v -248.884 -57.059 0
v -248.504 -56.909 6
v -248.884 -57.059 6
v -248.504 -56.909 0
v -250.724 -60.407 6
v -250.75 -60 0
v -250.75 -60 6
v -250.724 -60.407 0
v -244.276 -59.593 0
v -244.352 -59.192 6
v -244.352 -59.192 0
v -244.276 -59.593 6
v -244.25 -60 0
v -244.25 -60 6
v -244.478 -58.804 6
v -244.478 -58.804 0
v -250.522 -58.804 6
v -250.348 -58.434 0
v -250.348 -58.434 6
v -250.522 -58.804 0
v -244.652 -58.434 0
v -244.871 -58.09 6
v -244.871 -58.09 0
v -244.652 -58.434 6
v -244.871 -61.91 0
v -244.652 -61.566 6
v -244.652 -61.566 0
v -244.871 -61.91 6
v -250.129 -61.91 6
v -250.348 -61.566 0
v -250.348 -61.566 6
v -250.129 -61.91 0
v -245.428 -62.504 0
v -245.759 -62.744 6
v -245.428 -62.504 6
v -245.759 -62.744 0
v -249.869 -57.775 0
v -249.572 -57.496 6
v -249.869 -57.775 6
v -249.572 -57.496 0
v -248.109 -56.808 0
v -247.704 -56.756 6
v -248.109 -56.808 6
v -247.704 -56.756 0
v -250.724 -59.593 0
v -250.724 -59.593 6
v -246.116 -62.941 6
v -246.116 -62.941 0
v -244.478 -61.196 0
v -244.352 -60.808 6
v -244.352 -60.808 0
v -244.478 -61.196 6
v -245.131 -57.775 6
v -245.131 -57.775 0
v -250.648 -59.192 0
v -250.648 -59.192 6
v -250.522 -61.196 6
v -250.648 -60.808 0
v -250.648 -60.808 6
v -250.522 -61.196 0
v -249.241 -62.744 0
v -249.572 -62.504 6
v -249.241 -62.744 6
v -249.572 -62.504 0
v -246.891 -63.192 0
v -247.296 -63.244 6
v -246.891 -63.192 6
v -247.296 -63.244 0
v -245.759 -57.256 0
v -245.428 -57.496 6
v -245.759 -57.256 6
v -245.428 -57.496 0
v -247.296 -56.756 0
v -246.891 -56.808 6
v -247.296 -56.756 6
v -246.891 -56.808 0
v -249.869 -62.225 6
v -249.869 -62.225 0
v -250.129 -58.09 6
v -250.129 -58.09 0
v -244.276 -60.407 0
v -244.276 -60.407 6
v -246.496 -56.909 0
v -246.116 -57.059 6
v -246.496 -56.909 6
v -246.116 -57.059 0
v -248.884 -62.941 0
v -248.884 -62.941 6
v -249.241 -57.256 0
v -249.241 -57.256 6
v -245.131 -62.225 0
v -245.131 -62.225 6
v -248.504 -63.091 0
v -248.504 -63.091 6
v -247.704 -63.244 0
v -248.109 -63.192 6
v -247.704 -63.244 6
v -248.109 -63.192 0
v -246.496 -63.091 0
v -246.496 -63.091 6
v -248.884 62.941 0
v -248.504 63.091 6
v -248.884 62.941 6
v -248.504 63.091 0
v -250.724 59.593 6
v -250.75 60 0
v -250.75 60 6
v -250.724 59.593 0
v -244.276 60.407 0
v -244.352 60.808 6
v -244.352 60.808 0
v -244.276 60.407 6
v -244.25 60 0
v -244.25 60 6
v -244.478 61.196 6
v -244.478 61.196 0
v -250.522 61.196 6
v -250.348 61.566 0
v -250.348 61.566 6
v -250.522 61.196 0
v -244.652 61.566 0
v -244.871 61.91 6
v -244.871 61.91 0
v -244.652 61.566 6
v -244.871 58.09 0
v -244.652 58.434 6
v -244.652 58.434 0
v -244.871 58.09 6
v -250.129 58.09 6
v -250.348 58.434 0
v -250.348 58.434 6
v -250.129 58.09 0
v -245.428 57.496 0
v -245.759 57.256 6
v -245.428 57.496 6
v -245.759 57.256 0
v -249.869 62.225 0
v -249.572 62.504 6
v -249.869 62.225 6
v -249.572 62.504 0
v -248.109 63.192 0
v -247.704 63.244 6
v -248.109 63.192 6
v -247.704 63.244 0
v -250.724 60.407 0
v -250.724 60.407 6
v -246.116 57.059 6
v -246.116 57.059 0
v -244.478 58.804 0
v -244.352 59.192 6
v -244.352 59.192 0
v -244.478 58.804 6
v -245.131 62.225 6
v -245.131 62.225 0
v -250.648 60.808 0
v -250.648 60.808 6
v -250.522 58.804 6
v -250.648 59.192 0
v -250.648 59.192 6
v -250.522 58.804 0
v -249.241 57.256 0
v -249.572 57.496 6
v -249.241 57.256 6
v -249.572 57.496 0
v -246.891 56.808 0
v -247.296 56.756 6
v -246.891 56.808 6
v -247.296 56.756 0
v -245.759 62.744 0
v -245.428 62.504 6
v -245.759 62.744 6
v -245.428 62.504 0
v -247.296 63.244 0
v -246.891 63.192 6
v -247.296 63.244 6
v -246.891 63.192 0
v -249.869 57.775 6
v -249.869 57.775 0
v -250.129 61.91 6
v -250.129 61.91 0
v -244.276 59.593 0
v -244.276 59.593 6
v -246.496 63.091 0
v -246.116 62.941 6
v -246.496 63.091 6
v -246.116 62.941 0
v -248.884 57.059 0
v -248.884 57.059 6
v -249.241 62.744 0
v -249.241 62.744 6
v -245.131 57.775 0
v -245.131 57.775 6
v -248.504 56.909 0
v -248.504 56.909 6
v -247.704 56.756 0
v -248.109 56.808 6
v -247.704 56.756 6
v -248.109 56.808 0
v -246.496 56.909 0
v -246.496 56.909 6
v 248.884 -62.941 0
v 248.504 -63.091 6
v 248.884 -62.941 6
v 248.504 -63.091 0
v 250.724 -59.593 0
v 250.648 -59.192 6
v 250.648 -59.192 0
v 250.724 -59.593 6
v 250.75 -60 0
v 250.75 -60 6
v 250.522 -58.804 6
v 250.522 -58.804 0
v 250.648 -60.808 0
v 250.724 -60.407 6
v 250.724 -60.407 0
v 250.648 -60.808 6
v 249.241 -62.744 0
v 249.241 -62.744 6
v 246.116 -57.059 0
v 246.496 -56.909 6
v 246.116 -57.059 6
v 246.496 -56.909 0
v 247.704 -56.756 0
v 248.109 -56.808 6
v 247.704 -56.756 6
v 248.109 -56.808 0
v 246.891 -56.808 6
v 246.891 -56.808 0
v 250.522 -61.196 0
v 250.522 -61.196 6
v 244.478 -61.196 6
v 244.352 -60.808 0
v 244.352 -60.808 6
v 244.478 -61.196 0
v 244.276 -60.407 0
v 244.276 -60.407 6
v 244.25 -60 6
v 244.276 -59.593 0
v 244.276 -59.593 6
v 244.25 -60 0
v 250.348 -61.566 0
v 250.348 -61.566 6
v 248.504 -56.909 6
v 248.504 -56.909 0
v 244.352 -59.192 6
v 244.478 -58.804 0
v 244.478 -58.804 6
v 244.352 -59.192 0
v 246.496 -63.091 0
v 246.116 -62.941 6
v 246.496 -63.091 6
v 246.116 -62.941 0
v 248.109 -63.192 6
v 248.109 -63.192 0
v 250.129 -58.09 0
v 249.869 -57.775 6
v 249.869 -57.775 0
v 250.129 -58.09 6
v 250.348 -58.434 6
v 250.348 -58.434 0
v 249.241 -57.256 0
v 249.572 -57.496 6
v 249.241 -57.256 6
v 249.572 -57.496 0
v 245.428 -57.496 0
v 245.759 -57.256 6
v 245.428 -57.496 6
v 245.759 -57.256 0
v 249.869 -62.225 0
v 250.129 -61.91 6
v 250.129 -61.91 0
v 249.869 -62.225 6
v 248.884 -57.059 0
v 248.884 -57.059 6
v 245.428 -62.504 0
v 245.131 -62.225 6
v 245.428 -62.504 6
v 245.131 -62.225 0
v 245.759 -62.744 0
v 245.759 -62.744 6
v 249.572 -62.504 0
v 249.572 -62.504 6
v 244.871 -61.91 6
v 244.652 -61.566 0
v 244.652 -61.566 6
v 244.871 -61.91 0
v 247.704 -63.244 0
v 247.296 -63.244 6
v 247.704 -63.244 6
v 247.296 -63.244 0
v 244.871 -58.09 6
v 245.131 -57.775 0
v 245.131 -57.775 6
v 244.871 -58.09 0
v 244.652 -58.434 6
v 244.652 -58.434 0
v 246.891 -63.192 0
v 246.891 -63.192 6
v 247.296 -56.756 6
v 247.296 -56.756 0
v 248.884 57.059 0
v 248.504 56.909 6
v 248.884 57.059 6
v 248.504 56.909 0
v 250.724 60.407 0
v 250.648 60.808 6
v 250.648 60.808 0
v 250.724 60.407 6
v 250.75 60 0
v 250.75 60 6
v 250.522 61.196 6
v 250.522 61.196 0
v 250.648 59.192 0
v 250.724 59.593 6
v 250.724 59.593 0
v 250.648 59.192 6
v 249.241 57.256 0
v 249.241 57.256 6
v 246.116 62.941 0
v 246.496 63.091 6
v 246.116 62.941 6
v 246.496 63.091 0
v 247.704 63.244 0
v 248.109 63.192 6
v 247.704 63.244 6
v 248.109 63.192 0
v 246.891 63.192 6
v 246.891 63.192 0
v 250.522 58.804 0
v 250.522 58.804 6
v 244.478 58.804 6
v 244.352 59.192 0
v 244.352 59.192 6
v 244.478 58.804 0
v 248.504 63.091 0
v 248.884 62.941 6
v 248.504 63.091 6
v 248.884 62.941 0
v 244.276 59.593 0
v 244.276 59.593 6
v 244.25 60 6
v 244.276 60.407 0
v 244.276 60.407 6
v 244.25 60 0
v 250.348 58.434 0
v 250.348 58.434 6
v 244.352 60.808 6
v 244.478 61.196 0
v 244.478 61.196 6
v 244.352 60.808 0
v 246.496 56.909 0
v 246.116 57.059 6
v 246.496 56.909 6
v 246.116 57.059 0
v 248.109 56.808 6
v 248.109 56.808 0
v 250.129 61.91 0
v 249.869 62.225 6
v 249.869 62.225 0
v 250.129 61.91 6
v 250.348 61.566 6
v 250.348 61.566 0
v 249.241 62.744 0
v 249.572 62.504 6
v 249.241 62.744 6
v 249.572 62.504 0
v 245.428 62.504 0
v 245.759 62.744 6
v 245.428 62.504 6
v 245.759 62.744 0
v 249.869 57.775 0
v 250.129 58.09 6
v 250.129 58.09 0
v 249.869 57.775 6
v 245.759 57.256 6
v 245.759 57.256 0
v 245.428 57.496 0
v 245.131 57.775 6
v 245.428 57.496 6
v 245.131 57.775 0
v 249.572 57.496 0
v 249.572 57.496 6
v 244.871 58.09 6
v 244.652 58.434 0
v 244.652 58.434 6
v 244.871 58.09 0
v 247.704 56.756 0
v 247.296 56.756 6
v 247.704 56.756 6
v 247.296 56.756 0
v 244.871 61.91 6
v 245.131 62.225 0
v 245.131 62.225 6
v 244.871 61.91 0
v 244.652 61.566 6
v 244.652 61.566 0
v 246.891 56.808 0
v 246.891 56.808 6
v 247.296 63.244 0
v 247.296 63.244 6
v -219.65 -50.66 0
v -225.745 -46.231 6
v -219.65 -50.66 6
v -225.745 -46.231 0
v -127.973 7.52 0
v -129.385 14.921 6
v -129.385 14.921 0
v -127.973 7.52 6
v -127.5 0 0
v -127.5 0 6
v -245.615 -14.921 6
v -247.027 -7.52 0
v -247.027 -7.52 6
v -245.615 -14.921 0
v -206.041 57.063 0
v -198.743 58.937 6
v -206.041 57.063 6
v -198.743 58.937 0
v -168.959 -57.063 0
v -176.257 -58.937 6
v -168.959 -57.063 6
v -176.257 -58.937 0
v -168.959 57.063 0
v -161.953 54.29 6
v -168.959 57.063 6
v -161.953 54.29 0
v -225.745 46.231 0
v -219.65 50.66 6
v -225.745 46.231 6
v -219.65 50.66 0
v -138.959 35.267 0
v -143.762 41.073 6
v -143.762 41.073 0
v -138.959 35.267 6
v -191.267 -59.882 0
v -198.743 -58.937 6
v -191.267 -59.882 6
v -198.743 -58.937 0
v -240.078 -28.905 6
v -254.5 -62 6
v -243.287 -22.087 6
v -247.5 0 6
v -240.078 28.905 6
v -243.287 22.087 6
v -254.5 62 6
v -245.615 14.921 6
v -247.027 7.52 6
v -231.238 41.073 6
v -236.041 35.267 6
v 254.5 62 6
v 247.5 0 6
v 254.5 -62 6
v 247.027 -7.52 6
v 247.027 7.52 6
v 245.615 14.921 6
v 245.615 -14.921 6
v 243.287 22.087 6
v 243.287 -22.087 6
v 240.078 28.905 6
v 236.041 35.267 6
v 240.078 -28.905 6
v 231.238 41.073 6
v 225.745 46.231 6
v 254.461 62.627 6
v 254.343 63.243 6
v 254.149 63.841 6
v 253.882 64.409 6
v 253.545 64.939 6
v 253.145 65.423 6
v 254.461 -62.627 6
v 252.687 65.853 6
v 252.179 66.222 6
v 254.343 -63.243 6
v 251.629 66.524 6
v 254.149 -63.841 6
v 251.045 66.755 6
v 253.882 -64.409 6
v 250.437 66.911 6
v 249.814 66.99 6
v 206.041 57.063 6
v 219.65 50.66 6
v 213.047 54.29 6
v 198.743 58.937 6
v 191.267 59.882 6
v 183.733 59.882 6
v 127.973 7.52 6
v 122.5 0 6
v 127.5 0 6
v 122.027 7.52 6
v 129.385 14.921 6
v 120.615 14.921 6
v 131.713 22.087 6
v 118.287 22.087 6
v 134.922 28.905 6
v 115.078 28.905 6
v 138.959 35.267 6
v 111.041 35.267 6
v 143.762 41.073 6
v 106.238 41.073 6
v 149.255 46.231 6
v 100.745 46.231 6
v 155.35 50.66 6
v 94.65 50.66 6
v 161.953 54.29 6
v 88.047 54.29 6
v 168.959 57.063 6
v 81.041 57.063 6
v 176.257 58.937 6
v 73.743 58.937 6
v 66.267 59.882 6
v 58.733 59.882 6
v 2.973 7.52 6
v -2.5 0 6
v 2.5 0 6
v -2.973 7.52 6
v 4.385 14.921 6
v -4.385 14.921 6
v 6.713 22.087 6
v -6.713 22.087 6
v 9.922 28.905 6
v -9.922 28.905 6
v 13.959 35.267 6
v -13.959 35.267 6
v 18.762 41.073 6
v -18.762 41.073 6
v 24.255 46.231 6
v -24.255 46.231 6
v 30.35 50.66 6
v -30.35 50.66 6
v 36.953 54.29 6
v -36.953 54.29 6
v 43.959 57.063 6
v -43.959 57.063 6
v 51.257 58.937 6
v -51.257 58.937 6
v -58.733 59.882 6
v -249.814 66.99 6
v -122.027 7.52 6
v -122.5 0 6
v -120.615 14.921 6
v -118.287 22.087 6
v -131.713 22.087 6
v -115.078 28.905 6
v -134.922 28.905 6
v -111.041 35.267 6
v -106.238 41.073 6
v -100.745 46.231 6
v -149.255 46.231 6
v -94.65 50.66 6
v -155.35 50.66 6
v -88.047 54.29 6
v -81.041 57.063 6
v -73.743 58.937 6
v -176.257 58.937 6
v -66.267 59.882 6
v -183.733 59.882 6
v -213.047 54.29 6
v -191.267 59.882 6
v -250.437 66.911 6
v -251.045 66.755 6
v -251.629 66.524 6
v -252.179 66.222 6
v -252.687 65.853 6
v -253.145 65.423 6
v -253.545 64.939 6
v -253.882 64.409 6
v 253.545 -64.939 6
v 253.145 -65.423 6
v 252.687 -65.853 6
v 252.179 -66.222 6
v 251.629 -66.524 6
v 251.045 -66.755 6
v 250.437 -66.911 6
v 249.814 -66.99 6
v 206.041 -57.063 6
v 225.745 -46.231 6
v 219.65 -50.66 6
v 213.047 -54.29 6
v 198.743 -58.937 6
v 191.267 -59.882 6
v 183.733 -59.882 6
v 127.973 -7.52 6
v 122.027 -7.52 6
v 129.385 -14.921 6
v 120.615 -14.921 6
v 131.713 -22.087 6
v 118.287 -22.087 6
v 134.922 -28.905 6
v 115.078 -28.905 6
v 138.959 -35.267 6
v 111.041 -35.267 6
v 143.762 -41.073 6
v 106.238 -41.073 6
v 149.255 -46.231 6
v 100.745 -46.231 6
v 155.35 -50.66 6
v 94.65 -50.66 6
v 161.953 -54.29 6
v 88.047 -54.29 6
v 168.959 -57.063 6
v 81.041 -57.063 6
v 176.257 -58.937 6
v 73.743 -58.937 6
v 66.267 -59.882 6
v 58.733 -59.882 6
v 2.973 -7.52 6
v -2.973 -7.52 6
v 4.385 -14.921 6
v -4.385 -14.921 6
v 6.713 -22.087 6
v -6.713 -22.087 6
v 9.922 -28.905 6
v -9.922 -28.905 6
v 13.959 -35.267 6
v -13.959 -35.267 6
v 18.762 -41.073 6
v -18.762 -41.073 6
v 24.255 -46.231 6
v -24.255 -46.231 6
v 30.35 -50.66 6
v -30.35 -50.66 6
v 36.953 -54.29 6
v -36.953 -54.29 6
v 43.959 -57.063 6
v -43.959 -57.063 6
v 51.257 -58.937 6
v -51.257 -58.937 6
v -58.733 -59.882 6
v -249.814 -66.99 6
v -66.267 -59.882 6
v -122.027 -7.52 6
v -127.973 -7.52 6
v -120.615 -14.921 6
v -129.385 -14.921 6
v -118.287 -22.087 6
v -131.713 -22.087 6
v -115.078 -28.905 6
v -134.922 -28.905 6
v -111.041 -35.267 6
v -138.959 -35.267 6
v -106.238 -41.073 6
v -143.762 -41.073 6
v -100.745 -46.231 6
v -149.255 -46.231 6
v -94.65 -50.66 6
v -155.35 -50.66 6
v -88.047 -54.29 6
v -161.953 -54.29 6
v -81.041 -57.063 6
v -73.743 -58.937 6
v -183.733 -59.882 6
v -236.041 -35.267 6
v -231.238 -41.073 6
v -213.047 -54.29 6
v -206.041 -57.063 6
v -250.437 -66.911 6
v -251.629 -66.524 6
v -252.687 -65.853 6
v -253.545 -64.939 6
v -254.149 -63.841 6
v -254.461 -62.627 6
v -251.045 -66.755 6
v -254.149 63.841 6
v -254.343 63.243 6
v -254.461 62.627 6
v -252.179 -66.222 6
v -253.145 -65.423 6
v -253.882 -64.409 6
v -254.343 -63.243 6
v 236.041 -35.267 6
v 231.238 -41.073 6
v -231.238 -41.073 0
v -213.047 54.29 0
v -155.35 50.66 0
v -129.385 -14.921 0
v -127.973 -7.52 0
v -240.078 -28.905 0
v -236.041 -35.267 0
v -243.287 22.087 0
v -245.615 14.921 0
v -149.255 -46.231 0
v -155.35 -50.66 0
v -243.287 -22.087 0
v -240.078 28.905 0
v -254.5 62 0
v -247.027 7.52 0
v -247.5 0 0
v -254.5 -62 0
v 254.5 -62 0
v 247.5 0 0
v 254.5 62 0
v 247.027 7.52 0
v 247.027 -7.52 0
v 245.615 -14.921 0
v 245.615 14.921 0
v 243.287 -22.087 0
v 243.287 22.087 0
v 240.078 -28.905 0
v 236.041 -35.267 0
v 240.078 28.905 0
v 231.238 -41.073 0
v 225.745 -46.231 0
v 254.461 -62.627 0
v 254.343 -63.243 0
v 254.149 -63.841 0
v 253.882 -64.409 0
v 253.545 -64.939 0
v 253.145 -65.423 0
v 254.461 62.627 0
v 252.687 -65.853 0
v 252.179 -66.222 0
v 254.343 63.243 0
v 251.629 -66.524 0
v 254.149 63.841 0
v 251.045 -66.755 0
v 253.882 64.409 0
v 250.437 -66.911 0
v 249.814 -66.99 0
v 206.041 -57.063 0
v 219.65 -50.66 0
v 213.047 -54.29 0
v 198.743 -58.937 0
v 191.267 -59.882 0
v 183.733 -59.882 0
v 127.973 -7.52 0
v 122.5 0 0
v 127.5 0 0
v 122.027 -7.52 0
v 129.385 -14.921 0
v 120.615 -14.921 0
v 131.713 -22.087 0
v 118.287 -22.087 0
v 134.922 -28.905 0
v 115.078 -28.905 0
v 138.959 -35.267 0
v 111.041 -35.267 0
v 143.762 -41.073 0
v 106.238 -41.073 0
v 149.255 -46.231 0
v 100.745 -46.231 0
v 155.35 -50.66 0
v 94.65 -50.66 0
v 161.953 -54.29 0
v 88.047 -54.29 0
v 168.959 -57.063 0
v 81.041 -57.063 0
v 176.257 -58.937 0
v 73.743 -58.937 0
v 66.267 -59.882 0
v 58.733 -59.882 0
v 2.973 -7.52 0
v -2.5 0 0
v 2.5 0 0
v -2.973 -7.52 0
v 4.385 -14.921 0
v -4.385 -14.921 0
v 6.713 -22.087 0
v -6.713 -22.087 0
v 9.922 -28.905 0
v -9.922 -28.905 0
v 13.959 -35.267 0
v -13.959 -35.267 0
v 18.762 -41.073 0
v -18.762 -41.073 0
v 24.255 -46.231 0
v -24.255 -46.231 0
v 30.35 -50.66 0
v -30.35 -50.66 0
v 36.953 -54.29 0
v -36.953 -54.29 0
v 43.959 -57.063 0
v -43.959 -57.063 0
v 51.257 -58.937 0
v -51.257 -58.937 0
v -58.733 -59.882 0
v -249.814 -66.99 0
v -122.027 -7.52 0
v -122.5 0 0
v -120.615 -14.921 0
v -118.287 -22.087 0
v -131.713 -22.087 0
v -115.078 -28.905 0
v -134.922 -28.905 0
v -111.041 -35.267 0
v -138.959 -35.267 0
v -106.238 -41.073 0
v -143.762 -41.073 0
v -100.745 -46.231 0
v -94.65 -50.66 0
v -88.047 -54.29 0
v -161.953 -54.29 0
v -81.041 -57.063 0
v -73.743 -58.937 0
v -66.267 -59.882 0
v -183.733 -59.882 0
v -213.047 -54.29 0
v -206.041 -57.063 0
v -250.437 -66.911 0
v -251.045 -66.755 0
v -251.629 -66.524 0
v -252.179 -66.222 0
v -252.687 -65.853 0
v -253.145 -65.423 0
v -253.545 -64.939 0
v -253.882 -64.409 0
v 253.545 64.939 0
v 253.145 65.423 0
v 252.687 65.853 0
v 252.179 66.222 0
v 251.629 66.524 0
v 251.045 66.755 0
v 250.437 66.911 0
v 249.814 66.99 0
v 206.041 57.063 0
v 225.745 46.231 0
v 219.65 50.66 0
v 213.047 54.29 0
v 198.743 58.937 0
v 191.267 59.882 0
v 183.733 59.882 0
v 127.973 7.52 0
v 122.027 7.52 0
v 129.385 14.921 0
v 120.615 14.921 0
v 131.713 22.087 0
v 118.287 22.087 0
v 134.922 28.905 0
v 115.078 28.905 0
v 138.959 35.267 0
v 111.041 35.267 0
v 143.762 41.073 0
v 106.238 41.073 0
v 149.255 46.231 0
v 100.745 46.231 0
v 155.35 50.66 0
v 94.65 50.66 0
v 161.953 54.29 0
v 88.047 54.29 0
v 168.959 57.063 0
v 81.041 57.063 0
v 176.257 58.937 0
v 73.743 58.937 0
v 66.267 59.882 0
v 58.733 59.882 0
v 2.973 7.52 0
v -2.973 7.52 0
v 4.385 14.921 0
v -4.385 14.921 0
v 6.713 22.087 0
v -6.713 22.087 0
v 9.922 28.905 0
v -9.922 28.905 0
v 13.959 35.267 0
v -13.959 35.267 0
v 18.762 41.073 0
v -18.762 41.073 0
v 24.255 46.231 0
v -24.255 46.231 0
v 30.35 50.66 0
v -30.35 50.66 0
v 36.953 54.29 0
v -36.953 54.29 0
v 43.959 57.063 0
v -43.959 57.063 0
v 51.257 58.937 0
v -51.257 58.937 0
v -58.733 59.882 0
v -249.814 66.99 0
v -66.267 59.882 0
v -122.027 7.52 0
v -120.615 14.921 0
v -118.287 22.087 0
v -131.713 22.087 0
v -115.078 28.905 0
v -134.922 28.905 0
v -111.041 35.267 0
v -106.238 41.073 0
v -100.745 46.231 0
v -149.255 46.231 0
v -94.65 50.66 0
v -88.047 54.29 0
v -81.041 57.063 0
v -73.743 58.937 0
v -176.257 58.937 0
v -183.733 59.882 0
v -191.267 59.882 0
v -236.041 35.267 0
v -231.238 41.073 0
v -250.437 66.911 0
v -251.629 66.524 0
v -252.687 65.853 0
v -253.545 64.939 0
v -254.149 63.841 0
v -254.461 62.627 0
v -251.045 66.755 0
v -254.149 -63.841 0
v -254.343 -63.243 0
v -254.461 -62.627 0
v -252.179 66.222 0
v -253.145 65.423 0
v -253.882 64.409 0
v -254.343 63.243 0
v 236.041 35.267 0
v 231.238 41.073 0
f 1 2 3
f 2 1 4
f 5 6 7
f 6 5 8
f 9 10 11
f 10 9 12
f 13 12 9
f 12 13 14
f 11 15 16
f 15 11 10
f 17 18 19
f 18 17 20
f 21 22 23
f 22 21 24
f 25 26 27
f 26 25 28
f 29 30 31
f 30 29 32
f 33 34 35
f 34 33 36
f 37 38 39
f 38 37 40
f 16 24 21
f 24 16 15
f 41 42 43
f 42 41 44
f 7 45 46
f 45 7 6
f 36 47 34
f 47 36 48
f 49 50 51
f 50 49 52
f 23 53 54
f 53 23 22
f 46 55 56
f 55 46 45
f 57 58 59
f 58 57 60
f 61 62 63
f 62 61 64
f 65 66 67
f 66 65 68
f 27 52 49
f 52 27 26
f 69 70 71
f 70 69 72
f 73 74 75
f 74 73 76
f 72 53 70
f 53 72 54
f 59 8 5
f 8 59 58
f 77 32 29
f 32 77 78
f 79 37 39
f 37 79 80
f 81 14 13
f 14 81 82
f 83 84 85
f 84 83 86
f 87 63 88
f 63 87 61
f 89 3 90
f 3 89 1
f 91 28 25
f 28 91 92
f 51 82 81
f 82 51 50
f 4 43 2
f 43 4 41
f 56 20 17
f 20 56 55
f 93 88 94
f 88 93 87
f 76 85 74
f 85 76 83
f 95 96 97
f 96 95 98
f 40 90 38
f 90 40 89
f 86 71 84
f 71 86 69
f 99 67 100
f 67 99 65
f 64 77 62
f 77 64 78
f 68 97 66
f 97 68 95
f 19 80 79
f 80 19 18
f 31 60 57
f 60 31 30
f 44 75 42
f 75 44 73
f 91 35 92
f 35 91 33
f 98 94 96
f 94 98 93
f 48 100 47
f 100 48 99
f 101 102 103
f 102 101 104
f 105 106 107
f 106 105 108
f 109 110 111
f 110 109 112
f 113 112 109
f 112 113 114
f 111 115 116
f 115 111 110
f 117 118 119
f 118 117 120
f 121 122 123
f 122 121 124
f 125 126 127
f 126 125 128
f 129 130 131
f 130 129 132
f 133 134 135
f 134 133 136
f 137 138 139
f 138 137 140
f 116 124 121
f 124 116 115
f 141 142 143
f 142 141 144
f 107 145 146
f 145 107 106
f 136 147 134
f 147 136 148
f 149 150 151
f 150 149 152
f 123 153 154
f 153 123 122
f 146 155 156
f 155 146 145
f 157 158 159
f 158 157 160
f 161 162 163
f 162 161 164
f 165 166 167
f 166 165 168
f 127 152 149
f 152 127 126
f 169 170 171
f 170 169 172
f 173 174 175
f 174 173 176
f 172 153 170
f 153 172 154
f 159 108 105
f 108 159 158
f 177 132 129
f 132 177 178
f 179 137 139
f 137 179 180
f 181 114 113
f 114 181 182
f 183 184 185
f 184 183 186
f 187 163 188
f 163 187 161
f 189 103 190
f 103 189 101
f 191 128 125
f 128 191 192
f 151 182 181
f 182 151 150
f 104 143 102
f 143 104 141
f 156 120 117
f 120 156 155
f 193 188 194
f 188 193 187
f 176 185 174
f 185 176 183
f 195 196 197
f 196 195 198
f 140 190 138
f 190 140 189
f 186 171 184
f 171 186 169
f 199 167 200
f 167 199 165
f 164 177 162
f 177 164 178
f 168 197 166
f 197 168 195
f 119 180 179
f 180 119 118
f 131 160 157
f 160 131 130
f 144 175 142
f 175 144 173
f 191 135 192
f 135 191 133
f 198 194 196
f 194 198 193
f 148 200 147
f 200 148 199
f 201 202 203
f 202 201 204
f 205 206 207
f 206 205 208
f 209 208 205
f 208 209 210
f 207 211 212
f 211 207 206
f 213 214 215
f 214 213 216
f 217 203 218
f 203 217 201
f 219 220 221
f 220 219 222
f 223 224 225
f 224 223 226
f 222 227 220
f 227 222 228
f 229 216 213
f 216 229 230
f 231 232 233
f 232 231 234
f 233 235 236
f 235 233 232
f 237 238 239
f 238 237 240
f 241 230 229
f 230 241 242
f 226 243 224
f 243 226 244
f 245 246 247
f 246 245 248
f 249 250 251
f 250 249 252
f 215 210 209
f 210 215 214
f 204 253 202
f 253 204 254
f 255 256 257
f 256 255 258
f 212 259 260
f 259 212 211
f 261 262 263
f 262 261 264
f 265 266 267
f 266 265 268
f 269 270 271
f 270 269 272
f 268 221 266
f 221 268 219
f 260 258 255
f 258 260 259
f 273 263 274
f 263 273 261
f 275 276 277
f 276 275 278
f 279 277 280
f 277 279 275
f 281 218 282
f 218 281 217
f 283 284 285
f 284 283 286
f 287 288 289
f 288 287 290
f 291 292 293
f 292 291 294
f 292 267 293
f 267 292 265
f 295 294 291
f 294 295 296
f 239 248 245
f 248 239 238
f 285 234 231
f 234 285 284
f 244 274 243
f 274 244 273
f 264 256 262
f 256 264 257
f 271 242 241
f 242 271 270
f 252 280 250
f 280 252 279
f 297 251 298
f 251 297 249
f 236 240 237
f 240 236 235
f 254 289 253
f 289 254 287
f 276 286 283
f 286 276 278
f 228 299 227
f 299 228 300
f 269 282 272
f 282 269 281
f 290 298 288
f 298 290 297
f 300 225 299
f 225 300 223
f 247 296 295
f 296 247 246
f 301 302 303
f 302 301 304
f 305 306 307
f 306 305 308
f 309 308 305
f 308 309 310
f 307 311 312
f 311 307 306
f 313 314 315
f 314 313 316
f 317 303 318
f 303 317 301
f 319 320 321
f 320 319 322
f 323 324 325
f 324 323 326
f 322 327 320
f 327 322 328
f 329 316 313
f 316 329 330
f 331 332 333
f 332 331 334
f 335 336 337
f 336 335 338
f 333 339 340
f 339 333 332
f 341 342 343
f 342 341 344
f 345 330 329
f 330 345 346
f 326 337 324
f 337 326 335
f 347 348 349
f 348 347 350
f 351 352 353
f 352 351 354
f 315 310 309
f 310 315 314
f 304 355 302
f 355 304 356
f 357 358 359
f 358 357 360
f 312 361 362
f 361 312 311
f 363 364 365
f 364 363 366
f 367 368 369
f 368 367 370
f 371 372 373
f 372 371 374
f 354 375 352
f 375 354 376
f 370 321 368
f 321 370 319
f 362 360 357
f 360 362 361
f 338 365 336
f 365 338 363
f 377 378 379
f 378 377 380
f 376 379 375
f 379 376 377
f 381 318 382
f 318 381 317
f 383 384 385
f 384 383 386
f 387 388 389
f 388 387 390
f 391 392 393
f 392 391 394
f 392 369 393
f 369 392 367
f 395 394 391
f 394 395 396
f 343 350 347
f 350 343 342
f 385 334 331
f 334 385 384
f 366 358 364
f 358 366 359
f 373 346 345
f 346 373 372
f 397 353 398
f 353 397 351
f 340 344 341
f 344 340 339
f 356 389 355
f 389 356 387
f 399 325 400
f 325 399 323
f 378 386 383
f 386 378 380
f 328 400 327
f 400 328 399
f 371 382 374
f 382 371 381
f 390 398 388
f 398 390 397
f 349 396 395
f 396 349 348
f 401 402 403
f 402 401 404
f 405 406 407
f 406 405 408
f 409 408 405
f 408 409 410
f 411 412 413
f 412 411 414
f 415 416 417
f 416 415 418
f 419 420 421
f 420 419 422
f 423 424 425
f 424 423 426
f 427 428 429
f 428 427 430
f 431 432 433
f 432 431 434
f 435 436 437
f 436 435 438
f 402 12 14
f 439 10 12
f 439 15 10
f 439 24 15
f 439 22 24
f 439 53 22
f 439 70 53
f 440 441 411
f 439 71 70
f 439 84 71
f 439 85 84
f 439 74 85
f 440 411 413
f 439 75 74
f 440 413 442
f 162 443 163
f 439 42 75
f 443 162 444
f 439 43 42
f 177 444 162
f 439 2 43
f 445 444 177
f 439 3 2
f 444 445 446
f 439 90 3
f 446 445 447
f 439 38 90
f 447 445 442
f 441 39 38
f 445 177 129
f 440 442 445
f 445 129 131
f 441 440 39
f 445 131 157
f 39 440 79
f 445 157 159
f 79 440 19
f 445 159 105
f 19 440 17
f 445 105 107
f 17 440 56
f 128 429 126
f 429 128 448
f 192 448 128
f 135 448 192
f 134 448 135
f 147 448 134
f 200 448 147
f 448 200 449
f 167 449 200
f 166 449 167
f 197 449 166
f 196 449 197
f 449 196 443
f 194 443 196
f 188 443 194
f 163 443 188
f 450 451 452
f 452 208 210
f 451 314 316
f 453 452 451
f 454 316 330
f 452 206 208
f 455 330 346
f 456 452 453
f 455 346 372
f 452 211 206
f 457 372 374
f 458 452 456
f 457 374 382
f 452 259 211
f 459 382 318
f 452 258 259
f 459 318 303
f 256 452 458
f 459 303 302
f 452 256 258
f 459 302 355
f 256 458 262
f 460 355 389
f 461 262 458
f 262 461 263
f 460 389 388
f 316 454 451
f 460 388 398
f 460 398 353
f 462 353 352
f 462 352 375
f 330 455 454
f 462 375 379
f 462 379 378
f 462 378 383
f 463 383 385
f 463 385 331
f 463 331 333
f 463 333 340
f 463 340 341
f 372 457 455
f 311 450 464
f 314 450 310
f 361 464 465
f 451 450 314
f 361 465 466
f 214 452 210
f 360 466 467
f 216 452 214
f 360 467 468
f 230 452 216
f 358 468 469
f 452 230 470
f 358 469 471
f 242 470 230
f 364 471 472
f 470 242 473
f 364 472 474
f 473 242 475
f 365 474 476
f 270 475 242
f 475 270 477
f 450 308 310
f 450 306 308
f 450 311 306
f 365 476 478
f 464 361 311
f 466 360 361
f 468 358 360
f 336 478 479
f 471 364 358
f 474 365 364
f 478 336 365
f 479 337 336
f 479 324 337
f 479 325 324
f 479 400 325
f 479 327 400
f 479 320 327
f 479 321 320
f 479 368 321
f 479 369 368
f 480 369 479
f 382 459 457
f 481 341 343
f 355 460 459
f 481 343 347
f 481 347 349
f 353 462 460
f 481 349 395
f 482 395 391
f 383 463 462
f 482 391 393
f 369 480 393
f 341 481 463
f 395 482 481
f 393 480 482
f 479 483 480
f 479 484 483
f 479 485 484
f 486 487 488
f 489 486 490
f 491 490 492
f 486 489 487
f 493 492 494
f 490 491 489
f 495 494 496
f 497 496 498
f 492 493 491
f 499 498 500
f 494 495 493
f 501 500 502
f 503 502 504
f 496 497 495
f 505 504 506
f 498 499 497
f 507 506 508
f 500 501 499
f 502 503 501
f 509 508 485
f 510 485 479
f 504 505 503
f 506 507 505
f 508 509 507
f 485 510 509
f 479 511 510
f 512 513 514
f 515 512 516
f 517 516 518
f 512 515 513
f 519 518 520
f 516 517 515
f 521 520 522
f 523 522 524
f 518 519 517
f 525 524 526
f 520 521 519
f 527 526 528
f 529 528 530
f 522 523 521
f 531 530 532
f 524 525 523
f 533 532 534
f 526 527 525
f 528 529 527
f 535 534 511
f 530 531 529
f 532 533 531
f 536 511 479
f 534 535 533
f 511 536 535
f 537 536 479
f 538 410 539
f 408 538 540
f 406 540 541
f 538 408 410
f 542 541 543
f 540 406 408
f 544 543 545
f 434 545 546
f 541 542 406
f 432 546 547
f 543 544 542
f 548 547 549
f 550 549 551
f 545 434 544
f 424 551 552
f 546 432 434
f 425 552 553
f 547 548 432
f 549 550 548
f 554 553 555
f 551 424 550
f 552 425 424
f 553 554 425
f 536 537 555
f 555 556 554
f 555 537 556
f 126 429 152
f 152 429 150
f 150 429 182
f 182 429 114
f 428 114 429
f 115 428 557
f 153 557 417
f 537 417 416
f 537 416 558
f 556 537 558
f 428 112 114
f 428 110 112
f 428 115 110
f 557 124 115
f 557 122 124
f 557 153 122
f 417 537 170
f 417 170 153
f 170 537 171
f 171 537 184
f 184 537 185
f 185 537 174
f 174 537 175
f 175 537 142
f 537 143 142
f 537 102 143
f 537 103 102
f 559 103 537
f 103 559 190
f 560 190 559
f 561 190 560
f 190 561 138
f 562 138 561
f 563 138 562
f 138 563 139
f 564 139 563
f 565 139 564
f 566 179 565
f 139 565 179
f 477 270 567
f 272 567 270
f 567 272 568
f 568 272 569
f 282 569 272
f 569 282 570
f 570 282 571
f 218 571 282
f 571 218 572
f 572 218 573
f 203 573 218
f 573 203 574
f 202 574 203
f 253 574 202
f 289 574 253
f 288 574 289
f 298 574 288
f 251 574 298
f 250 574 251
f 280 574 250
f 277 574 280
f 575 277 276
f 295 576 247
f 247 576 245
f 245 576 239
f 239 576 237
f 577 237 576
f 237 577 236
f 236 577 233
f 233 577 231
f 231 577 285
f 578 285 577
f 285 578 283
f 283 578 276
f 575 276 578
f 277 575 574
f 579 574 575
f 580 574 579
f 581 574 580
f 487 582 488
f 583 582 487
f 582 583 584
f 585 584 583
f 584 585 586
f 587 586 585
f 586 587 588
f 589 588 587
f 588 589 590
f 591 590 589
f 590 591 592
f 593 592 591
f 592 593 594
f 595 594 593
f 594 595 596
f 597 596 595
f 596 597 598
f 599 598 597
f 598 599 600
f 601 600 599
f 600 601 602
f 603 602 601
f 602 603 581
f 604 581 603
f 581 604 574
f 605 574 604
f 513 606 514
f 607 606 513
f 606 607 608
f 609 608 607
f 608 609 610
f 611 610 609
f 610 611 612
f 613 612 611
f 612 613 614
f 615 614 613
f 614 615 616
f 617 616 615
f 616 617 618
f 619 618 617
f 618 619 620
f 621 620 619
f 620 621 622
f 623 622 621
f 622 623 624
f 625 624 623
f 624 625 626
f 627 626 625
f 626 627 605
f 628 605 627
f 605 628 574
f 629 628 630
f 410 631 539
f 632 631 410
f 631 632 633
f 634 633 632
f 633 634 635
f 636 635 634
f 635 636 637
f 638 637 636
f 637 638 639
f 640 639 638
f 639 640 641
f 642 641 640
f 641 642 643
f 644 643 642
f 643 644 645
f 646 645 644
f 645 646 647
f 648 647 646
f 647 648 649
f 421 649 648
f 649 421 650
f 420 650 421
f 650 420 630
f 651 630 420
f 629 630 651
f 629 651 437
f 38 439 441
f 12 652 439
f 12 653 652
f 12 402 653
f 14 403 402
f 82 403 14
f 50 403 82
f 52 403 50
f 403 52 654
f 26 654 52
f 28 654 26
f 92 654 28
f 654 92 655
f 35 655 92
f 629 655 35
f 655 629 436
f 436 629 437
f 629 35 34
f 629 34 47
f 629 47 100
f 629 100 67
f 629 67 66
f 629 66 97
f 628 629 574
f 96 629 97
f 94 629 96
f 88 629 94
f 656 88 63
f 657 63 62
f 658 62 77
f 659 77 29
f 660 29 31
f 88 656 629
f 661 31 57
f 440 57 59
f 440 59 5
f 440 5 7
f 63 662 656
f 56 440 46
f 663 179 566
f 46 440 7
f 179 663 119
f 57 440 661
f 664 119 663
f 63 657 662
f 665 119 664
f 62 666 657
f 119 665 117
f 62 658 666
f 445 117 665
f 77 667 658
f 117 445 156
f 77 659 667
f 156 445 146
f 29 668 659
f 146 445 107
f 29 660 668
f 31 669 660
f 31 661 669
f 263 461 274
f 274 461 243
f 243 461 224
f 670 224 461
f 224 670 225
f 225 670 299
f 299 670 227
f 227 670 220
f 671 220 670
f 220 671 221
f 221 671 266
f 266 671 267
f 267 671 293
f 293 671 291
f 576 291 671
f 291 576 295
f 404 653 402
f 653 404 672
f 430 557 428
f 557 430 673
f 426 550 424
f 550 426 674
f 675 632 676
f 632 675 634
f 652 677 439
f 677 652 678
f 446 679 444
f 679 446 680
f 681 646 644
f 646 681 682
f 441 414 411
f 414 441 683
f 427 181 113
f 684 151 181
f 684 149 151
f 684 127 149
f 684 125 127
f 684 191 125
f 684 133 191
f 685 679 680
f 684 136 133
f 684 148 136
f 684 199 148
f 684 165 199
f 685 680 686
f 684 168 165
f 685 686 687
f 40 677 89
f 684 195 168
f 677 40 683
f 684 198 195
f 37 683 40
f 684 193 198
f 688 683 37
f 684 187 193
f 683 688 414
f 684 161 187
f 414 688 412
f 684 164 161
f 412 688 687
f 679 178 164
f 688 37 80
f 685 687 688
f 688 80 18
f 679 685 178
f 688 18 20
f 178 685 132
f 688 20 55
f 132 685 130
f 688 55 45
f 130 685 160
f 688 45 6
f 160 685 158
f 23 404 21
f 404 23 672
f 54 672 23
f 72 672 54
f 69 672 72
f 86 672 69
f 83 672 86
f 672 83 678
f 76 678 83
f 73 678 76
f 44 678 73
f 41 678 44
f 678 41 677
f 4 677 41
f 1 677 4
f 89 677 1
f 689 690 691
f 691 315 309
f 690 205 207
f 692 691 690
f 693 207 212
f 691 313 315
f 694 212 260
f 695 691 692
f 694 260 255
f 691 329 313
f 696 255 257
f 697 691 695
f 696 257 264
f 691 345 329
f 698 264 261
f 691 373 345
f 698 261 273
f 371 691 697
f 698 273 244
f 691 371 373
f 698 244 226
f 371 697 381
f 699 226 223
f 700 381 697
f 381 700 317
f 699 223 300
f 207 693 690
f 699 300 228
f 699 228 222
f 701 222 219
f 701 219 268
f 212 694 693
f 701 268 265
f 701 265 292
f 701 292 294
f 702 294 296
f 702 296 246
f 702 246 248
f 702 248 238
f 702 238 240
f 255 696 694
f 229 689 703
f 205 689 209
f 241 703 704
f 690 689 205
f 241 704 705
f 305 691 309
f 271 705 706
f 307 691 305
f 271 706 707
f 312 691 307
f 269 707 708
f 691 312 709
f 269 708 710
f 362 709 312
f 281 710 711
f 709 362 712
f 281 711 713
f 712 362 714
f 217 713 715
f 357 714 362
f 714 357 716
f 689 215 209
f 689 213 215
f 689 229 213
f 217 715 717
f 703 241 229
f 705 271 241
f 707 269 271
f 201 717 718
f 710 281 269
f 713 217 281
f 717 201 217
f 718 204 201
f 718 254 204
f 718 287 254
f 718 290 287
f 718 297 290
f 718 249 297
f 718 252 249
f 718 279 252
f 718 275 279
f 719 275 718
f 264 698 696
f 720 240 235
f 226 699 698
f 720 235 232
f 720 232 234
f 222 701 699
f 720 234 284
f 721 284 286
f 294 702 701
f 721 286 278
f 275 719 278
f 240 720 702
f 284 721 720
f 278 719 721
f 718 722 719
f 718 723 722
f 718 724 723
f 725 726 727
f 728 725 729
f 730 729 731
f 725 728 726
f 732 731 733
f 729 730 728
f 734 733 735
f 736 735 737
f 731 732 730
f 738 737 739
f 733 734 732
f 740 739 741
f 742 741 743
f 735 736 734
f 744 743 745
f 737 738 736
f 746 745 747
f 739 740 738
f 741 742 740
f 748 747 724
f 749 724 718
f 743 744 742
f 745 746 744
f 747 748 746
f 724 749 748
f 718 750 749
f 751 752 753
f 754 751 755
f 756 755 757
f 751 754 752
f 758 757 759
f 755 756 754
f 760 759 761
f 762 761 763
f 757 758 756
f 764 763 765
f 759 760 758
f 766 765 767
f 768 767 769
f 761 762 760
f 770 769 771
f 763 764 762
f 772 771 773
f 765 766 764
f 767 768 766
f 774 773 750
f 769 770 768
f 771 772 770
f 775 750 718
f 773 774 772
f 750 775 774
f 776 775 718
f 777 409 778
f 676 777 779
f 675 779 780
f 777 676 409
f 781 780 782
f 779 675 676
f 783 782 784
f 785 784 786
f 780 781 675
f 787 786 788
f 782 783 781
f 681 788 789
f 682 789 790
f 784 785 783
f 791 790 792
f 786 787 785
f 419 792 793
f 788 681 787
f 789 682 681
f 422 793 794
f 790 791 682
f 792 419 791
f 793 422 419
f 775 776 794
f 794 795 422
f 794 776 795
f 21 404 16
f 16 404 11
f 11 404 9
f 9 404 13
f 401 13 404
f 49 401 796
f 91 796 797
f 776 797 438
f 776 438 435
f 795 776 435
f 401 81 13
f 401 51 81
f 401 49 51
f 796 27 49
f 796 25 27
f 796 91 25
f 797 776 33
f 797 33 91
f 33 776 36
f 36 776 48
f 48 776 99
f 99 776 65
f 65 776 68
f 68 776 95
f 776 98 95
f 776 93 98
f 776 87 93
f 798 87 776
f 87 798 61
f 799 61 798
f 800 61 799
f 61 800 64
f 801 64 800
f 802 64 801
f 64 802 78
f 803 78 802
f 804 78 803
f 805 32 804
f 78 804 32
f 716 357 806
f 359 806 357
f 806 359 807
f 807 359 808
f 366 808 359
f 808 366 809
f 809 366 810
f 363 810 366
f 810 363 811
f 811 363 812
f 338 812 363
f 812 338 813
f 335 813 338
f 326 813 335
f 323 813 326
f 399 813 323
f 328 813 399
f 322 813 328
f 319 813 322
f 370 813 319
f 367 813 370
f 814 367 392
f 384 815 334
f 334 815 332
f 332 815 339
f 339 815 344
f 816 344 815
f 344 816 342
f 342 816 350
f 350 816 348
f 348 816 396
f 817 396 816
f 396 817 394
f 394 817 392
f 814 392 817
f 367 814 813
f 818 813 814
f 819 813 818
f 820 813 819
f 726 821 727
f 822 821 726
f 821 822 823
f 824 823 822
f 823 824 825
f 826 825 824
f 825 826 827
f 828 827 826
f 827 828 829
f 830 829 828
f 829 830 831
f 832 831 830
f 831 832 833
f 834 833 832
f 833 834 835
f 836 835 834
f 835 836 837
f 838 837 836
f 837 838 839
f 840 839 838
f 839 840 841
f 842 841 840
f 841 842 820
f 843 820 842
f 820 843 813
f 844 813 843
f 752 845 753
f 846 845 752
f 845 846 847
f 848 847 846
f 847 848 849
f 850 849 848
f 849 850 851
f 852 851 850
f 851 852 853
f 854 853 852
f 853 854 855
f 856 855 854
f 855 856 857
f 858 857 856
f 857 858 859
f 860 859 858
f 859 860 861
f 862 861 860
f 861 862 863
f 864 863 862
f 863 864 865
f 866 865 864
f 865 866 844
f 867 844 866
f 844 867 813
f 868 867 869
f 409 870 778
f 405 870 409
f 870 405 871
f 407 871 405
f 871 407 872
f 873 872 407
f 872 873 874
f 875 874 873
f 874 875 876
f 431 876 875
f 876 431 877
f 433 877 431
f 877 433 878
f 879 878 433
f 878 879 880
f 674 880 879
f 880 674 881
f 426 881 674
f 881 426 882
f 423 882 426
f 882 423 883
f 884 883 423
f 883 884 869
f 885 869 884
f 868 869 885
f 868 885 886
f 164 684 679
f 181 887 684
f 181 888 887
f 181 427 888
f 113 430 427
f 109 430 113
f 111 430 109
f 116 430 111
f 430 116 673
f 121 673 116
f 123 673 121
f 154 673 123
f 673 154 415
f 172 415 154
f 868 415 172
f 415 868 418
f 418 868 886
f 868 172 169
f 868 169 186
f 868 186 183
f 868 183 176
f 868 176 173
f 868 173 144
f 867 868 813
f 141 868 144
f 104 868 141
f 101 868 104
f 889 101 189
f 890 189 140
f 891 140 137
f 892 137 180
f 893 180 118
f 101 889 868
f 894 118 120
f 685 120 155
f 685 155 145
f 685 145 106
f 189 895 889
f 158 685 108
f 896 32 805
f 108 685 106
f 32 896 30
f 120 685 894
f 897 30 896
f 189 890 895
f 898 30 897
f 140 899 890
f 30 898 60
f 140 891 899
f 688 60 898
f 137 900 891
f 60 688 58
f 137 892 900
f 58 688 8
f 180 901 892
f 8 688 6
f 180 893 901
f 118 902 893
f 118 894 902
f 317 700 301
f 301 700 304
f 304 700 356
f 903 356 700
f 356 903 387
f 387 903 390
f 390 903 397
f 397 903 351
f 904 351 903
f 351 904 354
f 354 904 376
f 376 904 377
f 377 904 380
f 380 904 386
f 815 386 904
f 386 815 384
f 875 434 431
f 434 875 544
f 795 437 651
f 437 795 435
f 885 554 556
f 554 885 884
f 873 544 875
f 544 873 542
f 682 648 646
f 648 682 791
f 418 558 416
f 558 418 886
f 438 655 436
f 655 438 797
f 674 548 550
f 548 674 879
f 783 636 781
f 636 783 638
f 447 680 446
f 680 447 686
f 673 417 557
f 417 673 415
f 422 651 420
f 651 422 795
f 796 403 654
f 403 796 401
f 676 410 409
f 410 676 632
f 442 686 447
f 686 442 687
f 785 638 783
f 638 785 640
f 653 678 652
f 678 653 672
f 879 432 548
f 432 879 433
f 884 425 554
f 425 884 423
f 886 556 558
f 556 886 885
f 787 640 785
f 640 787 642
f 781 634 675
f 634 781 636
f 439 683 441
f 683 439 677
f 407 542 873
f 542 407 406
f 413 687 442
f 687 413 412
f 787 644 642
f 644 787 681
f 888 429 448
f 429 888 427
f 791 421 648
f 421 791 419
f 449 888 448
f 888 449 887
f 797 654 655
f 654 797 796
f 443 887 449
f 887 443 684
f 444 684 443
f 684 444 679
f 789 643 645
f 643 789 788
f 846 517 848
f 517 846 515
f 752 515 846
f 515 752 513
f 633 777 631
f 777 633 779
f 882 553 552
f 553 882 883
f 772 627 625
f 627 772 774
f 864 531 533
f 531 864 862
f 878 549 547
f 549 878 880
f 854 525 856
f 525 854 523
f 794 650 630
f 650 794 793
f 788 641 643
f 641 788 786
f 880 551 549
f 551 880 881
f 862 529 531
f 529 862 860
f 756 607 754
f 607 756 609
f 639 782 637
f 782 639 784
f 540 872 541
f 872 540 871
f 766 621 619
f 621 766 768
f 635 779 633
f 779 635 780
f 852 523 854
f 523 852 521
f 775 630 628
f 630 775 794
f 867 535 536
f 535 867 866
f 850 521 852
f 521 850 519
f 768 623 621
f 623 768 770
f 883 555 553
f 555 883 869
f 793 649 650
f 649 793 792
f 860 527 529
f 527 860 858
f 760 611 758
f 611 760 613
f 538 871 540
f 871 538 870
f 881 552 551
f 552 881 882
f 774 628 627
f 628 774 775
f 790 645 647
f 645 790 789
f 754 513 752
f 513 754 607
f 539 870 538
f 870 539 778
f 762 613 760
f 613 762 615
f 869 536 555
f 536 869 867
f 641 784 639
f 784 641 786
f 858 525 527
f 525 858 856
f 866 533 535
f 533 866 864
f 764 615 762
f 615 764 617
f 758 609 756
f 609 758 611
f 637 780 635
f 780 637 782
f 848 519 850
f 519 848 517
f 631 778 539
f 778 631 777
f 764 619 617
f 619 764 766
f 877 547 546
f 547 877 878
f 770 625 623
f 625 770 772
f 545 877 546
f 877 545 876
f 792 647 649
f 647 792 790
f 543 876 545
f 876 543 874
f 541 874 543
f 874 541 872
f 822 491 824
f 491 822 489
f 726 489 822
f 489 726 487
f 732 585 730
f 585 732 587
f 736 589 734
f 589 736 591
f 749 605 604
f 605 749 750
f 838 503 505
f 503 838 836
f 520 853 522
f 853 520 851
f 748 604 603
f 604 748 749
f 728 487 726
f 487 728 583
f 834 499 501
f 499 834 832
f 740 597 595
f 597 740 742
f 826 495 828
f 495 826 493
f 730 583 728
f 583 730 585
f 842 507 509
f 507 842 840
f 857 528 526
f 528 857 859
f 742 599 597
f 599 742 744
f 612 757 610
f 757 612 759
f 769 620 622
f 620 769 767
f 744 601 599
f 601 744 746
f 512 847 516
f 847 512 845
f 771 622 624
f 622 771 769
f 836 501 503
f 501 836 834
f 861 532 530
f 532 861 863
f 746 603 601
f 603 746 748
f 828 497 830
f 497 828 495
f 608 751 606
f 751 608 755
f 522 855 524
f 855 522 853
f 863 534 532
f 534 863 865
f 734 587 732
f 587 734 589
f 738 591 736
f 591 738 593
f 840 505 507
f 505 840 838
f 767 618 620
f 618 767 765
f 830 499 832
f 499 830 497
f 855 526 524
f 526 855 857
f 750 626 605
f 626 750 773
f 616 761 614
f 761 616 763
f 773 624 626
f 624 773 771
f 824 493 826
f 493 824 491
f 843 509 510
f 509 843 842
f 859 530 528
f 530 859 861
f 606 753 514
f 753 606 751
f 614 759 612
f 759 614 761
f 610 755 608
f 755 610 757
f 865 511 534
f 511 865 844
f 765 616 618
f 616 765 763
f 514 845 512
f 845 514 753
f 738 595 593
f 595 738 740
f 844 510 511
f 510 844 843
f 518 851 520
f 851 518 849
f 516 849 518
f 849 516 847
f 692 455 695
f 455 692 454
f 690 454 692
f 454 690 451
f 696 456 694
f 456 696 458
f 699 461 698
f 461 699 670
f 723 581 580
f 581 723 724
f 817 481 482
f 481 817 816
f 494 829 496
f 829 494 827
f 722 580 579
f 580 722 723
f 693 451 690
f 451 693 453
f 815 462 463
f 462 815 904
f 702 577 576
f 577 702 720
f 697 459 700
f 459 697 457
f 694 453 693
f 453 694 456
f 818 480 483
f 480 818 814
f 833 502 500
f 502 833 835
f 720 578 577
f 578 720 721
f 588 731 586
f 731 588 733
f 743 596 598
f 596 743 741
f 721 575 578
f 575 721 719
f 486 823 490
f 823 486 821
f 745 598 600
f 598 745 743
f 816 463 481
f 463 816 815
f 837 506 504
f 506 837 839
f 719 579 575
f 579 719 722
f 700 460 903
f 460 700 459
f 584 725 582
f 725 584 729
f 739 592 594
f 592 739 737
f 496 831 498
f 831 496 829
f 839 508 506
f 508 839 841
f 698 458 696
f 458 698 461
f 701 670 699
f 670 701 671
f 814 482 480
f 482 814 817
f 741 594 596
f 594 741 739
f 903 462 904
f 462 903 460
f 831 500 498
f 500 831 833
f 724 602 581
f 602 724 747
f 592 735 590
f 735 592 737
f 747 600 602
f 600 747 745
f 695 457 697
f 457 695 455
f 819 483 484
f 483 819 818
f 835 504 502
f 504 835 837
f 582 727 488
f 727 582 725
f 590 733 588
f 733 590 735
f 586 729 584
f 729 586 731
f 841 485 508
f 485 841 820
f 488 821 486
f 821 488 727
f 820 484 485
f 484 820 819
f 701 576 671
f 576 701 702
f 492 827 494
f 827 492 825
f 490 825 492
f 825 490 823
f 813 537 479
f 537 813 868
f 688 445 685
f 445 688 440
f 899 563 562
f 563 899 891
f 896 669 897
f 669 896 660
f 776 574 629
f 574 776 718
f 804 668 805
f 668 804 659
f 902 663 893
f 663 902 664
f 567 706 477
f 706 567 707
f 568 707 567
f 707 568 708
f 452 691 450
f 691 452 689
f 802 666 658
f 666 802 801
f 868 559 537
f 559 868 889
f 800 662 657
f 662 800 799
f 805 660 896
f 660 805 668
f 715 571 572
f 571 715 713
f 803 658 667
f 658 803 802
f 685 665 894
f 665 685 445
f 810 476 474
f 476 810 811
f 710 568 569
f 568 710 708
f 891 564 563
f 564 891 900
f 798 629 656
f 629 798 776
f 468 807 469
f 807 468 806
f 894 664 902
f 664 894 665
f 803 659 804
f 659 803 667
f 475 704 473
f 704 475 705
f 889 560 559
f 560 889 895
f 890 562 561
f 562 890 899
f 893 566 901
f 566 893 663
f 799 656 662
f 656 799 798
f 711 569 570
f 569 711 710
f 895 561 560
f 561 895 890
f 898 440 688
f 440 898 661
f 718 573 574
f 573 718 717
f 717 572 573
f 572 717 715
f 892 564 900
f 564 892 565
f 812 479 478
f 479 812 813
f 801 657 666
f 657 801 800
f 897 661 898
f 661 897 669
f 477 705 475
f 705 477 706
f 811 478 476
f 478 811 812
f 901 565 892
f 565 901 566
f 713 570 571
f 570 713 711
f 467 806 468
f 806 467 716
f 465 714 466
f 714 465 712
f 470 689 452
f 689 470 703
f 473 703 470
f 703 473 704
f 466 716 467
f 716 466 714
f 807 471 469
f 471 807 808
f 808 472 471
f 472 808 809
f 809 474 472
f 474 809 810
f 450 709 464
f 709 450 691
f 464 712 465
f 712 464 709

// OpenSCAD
$fn = 50;


difference() {
	union() {
		hull() {
			translate(v = [-249.5000000000, 62.0000000000, 0]) {
				cylinder(h = 6, r = 5);
			}
			translate(v = [249.5000000000, 62.0000000000, 0]) {
				cylinder(h = 6, r = 5);
			}
			translate(v = [-249.5000000000, -62.0000000000, 0]) {
				cylinder(h = 6, r = 5);
			}
			translate(v = [249.5000000000, -62.0000000000, 0]) {
				cylinder(h = 6, r = 5);
			}
		}
	}
	union() {
		#translate(v = [-247.5000000000, -60.0000000000, -100.0000000000]) {
			cylinder(h = 200, r = 3.2500000000);
		}
		#translate(v = [-247.5000000000, 60.0000000000, -100.0000000000]) {
			cylinder(h = 200, r = 3.2500000000);
		}
		#translate(v = [247.5000000000, -60.0000000000, -100.0000000000]) {
			cylinder(h = 200, r = 3.2500000000);
		}
		#translate(v = [247.5000000000, 60.0000000000, -100.0000000000]) {
			cylinder(h = 200, r = 3.2500000000);
		}
		#translate(v = [-187.5000000000, 0, 0]) {
			cylinder(h = 6, r = 60.0000000000);
		}
		#translate(v = [-62.5000000000, 0, 0]) {
			cylinder(h = 6, r = 60.0000000000);
		}
		#translate(v = [62.5000000000, 0, 0]) {
			cylinder(h = 6, r = 60.0000000000);
		}
		#translate(v = [187.5000000000, 0, 0]) {
			cylinder(h = 6, r = 60.0000000000);
		}
	}
}
